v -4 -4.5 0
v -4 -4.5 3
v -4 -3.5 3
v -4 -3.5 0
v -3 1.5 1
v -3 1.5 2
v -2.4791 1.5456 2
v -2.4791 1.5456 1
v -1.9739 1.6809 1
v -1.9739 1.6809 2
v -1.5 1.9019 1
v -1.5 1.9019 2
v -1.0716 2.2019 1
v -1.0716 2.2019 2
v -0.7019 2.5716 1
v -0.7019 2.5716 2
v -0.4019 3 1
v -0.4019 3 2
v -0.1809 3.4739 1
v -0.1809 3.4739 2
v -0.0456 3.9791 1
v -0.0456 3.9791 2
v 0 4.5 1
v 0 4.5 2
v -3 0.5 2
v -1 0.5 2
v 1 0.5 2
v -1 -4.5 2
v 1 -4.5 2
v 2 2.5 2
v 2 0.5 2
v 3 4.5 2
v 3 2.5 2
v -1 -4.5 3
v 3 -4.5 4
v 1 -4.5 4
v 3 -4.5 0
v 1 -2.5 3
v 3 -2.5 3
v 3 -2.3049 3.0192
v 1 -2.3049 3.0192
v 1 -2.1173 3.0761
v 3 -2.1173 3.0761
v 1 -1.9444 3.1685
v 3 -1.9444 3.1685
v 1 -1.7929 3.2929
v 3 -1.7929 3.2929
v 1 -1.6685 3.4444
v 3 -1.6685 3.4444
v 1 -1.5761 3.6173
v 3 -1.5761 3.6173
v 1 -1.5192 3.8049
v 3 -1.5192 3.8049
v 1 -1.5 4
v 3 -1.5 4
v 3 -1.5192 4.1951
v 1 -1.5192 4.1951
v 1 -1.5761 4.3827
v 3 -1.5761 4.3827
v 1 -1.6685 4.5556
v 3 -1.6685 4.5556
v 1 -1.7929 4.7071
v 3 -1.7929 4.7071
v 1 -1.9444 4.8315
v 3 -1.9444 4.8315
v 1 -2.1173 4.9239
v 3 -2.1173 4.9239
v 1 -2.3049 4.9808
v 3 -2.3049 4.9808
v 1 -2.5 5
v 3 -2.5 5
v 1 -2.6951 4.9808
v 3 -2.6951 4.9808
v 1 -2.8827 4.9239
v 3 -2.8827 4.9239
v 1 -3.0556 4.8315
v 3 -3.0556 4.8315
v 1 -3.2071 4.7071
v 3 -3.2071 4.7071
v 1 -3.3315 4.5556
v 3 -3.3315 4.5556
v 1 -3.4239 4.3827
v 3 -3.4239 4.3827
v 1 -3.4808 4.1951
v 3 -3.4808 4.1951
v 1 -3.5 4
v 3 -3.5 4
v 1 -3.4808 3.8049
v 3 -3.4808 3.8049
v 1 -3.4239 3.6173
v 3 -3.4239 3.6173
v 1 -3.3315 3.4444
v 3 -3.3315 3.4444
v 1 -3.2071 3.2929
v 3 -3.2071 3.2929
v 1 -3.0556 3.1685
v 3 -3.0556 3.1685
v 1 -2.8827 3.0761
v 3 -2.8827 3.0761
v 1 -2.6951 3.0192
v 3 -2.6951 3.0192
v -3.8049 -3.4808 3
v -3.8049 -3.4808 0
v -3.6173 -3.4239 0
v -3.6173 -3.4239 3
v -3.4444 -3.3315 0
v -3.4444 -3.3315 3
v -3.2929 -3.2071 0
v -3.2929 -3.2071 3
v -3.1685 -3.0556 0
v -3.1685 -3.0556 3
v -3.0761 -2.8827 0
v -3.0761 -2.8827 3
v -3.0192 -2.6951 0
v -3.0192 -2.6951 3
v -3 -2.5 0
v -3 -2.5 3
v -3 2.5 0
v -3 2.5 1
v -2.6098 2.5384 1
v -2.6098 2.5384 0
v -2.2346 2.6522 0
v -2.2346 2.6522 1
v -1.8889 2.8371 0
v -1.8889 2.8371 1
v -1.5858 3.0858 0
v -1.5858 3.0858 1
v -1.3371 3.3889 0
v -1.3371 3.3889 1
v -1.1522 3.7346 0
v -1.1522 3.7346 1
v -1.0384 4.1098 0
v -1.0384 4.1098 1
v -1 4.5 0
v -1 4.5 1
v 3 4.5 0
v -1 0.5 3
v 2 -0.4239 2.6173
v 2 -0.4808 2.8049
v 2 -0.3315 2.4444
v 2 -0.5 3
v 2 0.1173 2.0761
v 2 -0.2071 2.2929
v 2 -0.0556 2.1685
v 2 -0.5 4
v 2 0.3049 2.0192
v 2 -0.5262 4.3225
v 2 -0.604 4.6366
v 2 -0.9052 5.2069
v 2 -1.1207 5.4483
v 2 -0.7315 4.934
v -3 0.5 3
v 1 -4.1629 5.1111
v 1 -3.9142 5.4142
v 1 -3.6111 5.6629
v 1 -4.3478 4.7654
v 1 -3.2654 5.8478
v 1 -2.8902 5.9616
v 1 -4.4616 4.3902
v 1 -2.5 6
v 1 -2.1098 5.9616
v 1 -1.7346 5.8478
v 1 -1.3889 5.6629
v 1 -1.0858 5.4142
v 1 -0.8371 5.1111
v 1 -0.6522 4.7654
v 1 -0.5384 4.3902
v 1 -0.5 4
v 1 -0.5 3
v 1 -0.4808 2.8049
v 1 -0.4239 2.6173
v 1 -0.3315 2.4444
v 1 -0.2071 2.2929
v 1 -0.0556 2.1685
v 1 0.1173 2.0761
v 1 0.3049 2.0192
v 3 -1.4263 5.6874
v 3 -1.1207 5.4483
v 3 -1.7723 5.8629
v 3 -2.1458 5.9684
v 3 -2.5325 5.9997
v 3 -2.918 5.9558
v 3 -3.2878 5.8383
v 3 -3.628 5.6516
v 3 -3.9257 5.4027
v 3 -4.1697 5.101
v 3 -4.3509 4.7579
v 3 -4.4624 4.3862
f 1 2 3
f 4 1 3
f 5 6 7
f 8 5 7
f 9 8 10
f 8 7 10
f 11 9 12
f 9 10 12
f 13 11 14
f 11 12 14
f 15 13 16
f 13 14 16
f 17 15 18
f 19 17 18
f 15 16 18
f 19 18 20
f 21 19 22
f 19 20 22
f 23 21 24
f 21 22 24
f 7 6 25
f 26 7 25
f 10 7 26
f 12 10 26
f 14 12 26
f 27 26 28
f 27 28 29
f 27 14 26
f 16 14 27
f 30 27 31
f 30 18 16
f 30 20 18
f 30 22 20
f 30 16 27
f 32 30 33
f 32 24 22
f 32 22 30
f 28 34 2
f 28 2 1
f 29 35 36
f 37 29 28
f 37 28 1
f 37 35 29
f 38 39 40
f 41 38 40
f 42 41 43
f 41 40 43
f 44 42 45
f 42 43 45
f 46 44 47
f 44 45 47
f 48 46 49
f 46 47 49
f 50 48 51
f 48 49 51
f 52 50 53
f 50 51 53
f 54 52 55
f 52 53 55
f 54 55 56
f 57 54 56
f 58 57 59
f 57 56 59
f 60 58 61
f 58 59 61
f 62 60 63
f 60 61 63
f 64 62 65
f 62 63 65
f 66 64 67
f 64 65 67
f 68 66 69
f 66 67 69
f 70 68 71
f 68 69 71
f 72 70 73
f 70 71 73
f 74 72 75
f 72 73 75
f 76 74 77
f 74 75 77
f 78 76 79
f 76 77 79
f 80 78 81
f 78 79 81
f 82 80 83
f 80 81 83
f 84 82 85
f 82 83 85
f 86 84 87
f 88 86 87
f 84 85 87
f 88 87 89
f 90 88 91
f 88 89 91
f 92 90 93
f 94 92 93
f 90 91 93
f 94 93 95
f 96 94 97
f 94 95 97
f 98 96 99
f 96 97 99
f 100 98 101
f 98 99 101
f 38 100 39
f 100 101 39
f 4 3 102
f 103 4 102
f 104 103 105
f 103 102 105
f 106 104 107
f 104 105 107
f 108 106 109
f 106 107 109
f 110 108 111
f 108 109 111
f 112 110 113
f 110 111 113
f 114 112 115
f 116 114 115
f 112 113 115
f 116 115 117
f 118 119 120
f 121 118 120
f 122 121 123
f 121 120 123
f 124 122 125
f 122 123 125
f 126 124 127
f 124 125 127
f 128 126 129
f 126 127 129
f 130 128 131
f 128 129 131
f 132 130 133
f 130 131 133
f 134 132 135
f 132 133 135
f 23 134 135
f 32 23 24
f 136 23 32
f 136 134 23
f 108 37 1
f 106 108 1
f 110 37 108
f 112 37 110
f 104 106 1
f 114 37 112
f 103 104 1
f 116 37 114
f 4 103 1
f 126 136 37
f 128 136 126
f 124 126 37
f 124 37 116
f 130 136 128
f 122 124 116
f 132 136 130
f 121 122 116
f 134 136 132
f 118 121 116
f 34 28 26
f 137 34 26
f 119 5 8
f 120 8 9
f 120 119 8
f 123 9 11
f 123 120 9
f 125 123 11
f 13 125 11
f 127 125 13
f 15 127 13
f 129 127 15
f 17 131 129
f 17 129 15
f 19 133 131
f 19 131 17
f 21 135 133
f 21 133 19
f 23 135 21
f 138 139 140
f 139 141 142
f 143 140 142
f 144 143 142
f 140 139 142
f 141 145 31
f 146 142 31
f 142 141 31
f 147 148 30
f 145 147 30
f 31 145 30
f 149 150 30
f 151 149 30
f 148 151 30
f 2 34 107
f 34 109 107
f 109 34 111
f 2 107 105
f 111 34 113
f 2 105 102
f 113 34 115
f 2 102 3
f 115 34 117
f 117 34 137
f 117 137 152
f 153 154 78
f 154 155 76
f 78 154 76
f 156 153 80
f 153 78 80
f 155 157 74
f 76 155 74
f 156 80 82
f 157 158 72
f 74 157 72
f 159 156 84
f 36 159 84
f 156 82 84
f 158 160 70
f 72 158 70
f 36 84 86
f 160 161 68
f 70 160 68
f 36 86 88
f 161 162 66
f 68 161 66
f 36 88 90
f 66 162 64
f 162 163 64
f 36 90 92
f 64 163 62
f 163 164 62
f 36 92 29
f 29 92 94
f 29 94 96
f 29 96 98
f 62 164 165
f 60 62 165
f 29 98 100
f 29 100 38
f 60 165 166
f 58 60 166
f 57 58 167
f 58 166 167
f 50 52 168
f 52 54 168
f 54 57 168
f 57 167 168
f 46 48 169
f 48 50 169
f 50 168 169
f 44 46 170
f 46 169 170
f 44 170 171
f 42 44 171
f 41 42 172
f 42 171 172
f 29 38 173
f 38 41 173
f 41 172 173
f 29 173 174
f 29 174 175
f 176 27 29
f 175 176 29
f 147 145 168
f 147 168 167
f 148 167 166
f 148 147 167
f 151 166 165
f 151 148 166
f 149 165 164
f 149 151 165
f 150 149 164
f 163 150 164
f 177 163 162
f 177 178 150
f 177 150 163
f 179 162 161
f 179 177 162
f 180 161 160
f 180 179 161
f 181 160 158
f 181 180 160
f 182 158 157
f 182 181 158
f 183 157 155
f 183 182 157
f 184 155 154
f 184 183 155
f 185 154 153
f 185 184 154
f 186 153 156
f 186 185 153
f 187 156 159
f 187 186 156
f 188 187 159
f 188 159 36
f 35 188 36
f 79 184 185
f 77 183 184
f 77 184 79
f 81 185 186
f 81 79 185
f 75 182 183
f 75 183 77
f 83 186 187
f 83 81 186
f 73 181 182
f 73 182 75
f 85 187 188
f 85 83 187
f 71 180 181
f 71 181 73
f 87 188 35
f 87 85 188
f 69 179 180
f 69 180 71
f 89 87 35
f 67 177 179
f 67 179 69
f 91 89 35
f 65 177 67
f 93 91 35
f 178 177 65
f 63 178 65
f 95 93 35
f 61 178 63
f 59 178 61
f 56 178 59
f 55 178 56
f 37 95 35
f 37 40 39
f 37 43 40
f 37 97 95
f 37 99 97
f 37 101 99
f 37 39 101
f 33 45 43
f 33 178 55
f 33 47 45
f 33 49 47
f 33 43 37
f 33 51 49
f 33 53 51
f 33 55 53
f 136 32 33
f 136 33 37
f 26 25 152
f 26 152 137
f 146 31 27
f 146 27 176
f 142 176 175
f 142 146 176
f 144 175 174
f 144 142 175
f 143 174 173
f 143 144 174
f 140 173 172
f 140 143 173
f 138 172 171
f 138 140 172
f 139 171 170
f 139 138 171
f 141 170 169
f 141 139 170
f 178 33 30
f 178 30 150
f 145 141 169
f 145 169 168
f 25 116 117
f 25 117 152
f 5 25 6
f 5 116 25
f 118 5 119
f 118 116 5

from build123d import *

# Parameters (mm, degrees)
SKETCH1_W           = 6
SKETCH1_H           = 9
BOSS_EXTRUDE1_DEPTH = 2
CUT_EXTRUDE1_DEPTH  = 3
CUT_EXTRUDE2_DEPTH  = 1
SKETCH4_W           = 2
SKETCH4_H           = 5
BOSS_EXTRUDE2_DEPTH = 1
BOSS_EXTRUDE3_DEPTH = 3
SKETCH7_R           = 1
BOSS_EXTRUDE4_DEPTH = 2
BOSS_EXTRUDE5_DEPTH = 1


with BuildPart() as part:
    # Sketch1 → Boss-Extrude1 (new body)
    with BuildSketch(Plane.XY):
        Rectangle(SKETCH1_W, SKETCH1_H)
    extrude(amount=BOSS_EXTRUDE1_DEPTH)

    # Sketch2 → Cut-Extrude1 (cut, through all)
    with BuildSketch(Plane.XY.offset(2)):
        with BuildLine():
            Line((-1, 4.5), (-3, 4.5))
            Line((-3, 4.5), (-3, 2.5))
            ThreePointArc((-3, 2.5), (-1.585786438, 3.085786438), (-1, 4.5))
        make_face()
    extrude(amount=-CUT_EXTRUDE1_DEPTH, mode=Mode.SUBTRACT)

    # Sketch3 → Cut-Extrude2 (cut)
    with BuildSketch(Plane.XY.offset(2)):
        with BuildLine():
            Line((0, 4.5), (-3, 4.5))
            Line((-3, 4.5), (-3, 1.5))
            ThreePointArc((-3, 1.5), (-0.878679656, 2.378679656), (0, 4.5))
        make_face()
    extrude(amount=-CUT_EXTRUDE2_DEPTH, mode=Mode.SUBTRACT)

    # Sketch4 → Boss-Extrude2 (add)
    with BuildSketch(Plane.XY.offset(2)):
        with Locations((-2, -2)):
            Rectangle(SKETCH4_W, SKETCH4_H)
    extrude(amount=BOSS_EXTRUDE2_DEPTH)

    # Sketch5 → Boss-Extrude3 (add)
    with BuildSketch(Plane.XY.offset(3)):
        with BuildLine():
            Line((-3, -4.5), (-4, -4.5))
            Line((-4, -4.5), (-4, -3.5))
            ThreePointArc((-4, -3.5), (-3.292893219, -3.207106781), (-3, -2.5))
            Line((-3, -2.5), (-3, -4.5))
        make_face()
    extrude(amount=-BOSS_EXTRUDE3_DEPTH)

    # Sketch7 → Boss-Extrude4 (add)
    with BuildSketch(Plane(origin=(3, 0, 0), x_dir=(0, 0, -1), z_dir=(1, 0, 0))):
        with BuildLine():
            Line((-4, -4.5), (-2, -4.5))
            Line((-2, -4.5), (-2, 0.5))
            ThreePointArc((-2, 0.5), (-2.292893219, -0.207106781), (-3, -0.5))
            Line((-3, -0.5), (-4, -0.5))
            ThreePointArc((-4, -0.5), (-6, -2.5), (-4, -4.5))
        make_face()
        with Locations((-4, -2.5)):
            Circle(SKETCH7_R, mode=Mode.SUBTRACT)
    extrude(amount=-BOSS_EXTRUDE4_DEPTH)

    # Sketch8 → Boss-Extrude5 (add)
    with BuildSketch(Plane(origin=(3, 0, 0), x_dir=(0, 0, -1), z_dir=(1, 0, 0))):
        with BuildLine():
            Line((-2, 2.5), (-5.448275862, -1.120689655))
            ThreePointArc((-5.448275862, -1.120689655), (-4.787838597, -0.66170994), (-4, -0.5))
            Line((-4, -0.5), (-3, -0.5))
            ThreePointArc((-3, -0.5), (-2.292893219, -0.207106781), (-2, 0.5))
            Line((-2, 0.5), (-2, 2.5))
        make_face()
    extrude(amount=-BOSS_EXTRUDE5_DEPTH)


solid = part.part
